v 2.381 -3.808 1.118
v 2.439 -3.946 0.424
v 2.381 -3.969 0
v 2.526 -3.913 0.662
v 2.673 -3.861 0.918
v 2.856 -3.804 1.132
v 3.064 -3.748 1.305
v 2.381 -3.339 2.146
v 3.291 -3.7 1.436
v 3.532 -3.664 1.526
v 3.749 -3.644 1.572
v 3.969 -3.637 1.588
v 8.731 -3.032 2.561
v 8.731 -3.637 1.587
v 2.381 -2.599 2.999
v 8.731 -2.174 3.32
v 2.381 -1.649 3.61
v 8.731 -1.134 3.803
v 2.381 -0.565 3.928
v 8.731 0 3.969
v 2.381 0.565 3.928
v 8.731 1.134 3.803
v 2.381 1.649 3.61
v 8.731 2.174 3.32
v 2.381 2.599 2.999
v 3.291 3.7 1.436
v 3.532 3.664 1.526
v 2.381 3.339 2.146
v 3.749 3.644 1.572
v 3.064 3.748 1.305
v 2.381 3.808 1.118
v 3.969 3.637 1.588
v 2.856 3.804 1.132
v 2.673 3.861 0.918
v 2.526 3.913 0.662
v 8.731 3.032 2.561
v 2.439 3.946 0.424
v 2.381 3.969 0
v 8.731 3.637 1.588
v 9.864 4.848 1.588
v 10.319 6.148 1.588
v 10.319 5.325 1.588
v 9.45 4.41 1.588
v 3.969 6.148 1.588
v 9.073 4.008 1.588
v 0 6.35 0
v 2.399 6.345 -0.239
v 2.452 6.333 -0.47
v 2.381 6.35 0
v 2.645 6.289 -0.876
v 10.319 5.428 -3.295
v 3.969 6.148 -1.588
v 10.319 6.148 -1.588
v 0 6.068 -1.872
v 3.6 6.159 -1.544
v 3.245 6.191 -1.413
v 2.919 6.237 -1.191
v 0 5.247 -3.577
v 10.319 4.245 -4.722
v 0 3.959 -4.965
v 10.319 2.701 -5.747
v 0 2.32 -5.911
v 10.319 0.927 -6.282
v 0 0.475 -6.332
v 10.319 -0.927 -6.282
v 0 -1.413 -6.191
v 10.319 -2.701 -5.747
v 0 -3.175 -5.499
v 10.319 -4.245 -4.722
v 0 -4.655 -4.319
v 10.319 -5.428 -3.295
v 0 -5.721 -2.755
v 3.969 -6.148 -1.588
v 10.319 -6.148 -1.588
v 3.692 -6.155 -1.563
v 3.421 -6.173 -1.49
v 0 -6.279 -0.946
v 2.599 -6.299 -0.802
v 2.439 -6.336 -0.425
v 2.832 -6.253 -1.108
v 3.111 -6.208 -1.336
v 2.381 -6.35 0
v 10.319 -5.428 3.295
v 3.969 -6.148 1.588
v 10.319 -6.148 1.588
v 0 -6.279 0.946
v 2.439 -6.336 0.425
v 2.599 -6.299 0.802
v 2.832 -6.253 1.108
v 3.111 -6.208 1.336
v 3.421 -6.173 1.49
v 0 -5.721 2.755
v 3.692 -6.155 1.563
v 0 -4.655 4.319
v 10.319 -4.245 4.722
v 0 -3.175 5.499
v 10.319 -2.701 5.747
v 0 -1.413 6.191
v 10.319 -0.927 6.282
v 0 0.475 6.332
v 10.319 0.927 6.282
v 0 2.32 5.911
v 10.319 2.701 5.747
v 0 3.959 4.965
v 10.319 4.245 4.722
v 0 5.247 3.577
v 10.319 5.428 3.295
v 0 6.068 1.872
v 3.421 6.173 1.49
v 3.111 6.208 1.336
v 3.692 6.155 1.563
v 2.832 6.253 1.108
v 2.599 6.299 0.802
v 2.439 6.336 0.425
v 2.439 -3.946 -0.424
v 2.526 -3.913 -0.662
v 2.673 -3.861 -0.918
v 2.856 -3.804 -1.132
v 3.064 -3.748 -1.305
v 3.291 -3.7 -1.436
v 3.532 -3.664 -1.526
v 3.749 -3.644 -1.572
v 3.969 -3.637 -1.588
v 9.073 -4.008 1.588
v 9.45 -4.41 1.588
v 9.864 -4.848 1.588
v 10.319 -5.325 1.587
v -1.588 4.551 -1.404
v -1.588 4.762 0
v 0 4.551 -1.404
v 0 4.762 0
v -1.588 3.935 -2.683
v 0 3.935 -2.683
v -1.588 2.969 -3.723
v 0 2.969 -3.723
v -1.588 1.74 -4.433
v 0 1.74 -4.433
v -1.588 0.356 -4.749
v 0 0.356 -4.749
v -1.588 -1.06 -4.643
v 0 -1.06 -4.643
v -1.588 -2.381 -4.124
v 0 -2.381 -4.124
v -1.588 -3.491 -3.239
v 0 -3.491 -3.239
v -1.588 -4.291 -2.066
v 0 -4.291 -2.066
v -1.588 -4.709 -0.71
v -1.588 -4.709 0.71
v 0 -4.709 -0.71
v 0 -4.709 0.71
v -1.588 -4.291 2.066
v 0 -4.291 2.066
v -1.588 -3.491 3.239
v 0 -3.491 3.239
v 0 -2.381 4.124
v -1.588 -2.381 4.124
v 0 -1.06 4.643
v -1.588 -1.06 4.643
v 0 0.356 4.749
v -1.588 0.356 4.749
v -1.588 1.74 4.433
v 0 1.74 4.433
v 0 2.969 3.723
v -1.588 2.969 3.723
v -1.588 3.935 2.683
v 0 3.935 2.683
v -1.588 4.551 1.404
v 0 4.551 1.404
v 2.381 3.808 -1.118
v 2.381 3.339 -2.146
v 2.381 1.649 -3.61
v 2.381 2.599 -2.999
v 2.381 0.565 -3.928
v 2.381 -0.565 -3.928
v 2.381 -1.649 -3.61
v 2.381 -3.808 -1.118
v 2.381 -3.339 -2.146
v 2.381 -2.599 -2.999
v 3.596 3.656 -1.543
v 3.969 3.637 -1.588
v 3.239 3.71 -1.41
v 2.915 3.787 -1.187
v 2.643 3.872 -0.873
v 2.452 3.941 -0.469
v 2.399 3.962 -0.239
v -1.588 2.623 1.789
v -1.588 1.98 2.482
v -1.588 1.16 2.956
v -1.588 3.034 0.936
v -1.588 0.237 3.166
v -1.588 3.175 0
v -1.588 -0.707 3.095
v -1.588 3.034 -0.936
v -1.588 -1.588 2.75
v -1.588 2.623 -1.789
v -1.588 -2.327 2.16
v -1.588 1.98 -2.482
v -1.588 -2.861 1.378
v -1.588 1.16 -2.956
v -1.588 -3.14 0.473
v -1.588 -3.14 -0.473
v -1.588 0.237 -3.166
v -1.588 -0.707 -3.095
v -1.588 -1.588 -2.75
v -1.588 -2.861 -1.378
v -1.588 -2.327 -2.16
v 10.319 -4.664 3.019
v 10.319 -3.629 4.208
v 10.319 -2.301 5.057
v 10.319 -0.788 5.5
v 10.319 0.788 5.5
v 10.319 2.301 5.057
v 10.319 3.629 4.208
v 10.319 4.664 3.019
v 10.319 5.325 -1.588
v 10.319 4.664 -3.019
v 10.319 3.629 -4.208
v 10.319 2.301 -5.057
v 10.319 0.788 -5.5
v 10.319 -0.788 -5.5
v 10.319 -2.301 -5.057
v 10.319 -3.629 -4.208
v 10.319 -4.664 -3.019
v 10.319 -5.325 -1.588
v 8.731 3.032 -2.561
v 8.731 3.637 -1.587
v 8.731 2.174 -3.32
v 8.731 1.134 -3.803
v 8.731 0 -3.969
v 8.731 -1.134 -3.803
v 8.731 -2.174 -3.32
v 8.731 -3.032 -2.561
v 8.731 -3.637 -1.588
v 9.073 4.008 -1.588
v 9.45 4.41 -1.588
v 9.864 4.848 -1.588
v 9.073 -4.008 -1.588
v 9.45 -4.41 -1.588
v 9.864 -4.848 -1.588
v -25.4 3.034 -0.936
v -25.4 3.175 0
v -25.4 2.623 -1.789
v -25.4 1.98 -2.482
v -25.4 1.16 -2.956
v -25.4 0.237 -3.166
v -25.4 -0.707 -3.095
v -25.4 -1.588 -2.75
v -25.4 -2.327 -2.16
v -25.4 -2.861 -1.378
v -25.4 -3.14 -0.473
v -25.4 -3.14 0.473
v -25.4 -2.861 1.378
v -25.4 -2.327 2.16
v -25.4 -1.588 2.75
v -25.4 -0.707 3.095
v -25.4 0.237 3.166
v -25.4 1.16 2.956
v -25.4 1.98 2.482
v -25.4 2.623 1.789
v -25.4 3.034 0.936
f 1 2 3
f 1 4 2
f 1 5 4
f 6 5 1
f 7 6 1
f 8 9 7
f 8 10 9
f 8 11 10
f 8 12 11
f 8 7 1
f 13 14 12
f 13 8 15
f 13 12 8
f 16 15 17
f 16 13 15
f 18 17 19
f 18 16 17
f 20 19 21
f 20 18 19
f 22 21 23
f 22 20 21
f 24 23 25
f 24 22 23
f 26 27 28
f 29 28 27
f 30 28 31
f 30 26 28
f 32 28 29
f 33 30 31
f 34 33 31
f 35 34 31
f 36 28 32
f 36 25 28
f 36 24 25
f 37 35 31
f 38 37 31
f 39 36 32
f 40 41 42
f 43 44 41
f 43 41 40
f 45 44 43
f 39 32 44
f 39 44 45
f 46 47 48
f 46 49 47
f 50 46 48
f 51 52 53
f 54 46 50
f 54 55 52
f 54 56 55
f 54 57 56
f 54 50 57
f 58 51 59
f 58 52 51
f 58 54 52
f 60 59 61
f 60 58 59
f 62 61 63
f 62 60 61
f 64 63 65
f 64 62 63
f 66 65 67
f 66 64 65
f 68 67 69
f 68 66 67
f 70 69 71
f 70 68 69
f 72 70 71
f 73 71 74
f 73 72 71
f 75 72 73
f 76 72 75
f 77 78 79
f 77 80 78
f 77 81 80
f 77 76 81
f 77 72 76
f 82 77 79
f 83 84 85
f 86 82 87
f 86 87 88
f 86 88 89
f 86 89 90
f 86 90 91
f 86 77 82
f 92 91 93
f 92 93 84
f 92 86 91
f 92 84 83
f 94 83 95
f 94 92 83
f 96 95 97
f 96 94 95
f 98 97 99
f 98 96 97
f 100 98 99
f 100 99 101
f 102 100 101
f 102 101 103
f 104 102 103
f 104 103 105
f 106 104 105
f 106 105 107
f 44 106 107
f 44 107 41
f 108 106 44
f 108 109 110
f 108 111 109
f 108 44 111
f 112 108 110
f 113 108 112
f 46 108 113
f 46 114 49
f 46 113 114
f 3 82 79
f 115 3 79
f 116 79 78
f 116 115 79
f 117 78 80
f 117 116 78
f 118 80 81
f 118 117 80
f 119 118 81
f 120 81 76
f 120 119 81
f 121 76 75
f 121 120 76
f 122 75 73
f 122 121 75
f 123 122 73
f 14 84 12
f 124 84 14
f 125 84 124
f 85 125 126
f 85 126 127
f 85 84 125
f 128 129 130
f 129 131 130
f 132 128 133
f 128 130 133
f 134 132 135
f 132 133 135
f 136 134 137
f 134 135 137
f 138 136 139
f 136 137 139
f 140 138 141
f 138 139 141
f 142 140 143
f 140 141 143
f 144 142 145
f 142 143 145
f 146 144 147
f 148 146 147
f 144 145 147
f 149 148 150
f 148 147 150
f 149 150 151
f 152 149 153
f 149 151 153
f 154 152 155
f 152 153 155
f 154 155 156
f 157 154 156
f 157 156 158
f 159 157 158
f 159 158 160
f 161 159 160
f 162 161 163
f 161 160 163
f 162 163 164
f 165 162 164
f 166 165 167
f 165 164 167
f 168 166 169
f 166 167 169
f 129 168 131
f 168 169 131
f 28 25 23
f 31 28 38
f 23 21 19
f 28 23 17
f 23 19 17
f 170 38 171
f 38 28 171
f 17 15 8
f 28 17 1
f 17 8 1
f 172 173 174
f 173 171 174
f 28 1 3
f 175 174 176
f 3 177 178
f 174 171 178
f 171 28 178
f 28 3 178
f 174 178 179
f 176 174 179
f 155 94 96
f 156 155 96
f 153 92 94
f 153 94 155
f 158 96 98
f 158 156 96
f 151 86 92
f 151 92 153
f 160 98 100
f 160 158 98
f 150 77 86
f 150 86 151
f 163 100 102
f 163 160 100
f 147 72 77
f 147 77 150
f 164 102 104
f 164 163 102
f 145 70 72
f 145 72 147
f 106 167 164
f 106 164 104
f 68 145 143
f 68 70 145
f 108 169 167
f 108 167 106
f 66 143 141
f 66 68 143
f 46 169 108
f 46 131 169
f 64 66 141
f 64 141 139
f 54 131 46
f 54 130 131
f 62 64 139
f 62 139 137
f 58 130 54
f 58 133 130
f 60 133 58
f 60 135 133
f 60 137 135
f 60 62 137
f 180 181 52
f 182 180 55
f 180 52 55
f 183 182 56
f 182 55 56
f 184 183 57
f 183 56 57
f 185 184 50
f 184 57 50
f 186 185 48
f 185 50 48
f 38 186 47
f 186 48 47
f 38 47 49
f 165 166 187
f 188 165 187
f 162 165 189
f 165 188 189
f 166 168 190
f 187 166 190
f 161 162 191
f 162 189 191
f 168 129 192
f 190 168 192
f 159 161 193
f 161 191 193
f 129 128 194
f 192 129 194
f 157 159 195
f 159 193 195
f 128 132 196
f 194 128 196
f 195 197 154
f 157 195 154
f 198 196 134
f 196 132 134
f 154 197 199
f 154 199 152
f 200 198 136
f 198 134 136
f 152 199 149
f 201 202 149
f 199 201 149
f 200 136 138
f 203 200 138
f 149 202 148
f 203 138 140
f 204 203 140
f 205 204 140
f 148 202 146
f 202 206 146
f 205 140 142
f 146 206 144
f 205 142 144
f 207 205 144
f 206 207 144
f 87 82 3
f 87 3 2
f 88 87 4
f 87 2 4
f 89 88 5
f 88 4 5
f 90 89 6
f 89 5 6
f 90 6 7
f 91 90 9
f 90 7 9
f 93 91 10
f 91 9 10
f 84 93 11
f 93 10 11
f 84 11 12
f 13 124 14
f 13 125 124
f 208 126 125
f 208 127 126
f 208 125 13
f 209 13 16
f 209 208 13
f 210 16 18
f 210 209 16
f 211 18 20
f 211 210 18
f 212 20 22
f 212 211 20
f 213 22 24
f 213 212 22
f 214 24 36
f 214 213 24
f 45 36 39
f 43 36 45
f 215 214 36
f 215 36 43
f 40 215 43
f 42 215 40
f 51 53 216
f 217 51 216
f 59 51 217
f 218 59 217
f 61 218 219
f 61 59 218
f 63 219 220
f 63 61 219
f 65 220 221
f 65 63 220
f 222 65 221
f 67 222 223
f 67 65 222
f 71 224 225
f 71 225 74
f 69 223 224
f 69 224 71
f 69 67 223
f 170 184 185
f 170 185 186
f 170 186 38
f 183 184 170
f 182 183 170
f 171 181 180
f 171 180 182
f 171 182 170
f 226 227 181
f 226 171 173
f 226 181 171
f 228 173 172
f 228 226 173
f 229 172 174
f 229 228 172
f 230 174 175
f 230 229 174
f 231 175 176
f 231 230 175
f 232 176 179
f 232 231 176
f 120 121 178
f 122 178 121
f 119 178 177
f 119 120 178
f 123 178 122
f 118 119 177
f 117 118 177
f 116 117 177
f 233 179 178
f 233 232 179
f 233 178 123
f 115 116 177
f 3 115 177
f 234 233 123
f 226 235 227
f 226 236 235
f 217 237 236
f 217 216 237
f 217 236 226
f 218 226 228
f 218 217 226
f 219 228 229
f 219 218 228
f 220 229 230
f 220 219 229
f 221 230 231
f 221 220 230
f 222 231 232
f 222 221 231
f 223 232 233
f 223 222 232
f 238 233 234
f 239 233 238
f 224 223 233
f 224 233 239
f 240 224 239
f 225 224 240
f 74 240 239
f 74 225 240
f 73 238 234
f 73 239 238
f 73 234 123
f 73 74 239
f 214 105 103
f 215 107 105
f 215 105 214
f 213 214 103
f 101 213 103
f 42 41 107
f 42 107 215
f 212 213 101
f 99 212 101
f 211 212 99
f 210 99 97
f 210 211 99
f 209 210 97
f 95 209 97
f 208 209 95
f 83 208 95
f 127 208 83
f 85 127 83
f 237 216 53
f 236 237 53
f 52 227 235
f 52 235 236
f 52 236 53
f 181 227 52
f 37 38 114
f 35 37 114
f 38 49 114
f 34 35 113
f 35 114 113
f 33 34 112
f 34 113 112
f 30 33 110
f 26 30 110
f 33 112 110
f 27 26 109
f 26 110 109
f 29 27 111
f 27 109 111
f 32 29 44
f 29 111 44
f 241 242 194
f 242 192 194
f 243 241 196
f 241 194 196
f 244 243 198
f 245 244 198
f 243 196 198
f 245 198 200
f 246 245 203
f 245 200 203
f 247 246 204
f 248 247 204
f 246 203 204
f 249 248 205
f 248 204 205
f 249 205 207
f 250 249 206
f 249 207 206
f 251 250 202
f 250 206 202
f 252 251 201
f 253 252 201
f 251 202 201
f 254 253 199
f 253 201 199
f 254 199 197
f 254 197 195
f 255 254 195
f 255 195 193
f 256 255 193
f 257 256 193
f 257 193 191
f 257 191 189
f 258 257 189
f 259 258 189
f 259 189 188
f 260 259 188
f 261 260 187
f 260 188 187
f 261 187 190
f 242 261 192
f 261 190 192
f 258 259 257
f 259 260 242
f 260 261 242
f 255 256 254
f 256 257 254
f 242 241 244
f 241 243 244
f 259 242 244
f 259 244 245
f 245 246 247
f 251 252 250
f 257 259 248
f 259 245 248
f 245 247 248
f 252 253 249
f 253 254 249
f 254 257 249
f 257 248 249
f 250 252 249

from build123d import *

# Parameters (mm, degrees)
SKETCH1_W               = 25.4
SKETCH1_H               = 3.175
SKETCH1_W_2             = 1.5875
SKETCH1_H_2             = 1.5875
SKETCH1_W_3             = 7.9375
SKETCH1_H_3             = 2.38125
CUT_EXTRUDE1_DEPTH      = 27.940768363
CUT_EXTRUDE1_DEPTH_BACK = 27.940768363
SKETCH2_W               = 0.79375
SKETCH2_H               = 3.175
SKETCH2_R               = 1.5875
FILLET1_R               = 1.5875
CHAMFER1_SIZE           = 1.5875


with BuildPart() as part:
    # Sketch1 → Revolve1 (revolve)
    with BuildSketch(Plane.XY):
        with Locations((-12.7, 1.5875)):
            Rectangle(SKETCH1_W, SKETCH1_H)
        with Locations((-0.79375, 3.96875)):
            Rectangle(SKETCH1_W_2, SKETCH1_H_2)
        Polygon((0, 3.175), (0, 0), (2.38125, 0), (2.38125, 3.96875), (2.38125, 6.35), (0, 6.35), (0, 4.7625), align=None)
        with Locations((6.35, 5.159375)):
            Rectangle(SKETCH1_W_3, SKETCH1_H_3)
    revolve(axis=Axis((0, 0, 0), (-1, 0, 0)))

    # Sketch2 → Cut-Extrude1 (cut, two sides: drawn at the far end of the back side and taken through both)
    with BuildSketch(Plane(origin=(0, 0, 0), x_dir=(1, 0, 0), z_dir=(0, 1, 0)).offset(-CUT_EXTRUDE1_DEPTH_BACK)):
        with Locations((2.778125, 0)):
            Rectangle(SKETCH2_W, SKETCH2_H)
        with BuildLine():
            Line((3.175, -1.5875), (6.35, -1.5875))
            ThreePointArc((6.35, -1.5875), (4.7625, 0), (6.35, 1.5875))
            Line((6.35, 1.5875), (3.175, 1.5875))
            Line((3.175, 1.5875), (3.175, -1.5875))
        make_face()
        with Locations((6.35, 0)):
            Circle(SKETCH2_R)
        with BuildLine():
            Line((6.35, -1.5875), (10.31875, -1.5875))
            Line((10.31875, -1.5875), (10.31875, 1.5875))
            Line((10.31875, 1.5875), (6.35, 1.5875))
            ThreePointArc((6.35, 1.5875), (7.472532015, 1.122532015), (7.9375, 0))
            ThreePointArc((7.9375, 0), (7.472532015, -1.122532015), (6.35, -1.5875))
        make_face()
    extrude(amount=CUT_EXTRUDE1_DEPTH + CUT_EXTRUDE1_DEPTH_BACK, mode=Mode.SUBTRACT)

    # Fillet1
    fillet1_edges = [part.edges().sort_by_distance(p)[0] for p in [
        (2.38125, -4.89289026, -1.5875),
        (2.38125, 4.89289026, -1.5875),
        (2.38125, -4.89289026, 1.5875),
        (2.38125, 4.89289026, 1.5875),
    ]]
    fillet(fillet1_edges, radius=FILLET1_R - 0.0001)  # a hair under: the kernel refuses the full size

    # Chamfer1
    chamfer1_edges = [part.edges().sort_by_distance(p)[0] for p in [
        (10.31875, 0, 3.96875),
        (10.31875, 0, -3.96875),
    ]]
    chamfer(chamfer1_edges, length=CHAMFER1_SIZE)


solid = part.part
